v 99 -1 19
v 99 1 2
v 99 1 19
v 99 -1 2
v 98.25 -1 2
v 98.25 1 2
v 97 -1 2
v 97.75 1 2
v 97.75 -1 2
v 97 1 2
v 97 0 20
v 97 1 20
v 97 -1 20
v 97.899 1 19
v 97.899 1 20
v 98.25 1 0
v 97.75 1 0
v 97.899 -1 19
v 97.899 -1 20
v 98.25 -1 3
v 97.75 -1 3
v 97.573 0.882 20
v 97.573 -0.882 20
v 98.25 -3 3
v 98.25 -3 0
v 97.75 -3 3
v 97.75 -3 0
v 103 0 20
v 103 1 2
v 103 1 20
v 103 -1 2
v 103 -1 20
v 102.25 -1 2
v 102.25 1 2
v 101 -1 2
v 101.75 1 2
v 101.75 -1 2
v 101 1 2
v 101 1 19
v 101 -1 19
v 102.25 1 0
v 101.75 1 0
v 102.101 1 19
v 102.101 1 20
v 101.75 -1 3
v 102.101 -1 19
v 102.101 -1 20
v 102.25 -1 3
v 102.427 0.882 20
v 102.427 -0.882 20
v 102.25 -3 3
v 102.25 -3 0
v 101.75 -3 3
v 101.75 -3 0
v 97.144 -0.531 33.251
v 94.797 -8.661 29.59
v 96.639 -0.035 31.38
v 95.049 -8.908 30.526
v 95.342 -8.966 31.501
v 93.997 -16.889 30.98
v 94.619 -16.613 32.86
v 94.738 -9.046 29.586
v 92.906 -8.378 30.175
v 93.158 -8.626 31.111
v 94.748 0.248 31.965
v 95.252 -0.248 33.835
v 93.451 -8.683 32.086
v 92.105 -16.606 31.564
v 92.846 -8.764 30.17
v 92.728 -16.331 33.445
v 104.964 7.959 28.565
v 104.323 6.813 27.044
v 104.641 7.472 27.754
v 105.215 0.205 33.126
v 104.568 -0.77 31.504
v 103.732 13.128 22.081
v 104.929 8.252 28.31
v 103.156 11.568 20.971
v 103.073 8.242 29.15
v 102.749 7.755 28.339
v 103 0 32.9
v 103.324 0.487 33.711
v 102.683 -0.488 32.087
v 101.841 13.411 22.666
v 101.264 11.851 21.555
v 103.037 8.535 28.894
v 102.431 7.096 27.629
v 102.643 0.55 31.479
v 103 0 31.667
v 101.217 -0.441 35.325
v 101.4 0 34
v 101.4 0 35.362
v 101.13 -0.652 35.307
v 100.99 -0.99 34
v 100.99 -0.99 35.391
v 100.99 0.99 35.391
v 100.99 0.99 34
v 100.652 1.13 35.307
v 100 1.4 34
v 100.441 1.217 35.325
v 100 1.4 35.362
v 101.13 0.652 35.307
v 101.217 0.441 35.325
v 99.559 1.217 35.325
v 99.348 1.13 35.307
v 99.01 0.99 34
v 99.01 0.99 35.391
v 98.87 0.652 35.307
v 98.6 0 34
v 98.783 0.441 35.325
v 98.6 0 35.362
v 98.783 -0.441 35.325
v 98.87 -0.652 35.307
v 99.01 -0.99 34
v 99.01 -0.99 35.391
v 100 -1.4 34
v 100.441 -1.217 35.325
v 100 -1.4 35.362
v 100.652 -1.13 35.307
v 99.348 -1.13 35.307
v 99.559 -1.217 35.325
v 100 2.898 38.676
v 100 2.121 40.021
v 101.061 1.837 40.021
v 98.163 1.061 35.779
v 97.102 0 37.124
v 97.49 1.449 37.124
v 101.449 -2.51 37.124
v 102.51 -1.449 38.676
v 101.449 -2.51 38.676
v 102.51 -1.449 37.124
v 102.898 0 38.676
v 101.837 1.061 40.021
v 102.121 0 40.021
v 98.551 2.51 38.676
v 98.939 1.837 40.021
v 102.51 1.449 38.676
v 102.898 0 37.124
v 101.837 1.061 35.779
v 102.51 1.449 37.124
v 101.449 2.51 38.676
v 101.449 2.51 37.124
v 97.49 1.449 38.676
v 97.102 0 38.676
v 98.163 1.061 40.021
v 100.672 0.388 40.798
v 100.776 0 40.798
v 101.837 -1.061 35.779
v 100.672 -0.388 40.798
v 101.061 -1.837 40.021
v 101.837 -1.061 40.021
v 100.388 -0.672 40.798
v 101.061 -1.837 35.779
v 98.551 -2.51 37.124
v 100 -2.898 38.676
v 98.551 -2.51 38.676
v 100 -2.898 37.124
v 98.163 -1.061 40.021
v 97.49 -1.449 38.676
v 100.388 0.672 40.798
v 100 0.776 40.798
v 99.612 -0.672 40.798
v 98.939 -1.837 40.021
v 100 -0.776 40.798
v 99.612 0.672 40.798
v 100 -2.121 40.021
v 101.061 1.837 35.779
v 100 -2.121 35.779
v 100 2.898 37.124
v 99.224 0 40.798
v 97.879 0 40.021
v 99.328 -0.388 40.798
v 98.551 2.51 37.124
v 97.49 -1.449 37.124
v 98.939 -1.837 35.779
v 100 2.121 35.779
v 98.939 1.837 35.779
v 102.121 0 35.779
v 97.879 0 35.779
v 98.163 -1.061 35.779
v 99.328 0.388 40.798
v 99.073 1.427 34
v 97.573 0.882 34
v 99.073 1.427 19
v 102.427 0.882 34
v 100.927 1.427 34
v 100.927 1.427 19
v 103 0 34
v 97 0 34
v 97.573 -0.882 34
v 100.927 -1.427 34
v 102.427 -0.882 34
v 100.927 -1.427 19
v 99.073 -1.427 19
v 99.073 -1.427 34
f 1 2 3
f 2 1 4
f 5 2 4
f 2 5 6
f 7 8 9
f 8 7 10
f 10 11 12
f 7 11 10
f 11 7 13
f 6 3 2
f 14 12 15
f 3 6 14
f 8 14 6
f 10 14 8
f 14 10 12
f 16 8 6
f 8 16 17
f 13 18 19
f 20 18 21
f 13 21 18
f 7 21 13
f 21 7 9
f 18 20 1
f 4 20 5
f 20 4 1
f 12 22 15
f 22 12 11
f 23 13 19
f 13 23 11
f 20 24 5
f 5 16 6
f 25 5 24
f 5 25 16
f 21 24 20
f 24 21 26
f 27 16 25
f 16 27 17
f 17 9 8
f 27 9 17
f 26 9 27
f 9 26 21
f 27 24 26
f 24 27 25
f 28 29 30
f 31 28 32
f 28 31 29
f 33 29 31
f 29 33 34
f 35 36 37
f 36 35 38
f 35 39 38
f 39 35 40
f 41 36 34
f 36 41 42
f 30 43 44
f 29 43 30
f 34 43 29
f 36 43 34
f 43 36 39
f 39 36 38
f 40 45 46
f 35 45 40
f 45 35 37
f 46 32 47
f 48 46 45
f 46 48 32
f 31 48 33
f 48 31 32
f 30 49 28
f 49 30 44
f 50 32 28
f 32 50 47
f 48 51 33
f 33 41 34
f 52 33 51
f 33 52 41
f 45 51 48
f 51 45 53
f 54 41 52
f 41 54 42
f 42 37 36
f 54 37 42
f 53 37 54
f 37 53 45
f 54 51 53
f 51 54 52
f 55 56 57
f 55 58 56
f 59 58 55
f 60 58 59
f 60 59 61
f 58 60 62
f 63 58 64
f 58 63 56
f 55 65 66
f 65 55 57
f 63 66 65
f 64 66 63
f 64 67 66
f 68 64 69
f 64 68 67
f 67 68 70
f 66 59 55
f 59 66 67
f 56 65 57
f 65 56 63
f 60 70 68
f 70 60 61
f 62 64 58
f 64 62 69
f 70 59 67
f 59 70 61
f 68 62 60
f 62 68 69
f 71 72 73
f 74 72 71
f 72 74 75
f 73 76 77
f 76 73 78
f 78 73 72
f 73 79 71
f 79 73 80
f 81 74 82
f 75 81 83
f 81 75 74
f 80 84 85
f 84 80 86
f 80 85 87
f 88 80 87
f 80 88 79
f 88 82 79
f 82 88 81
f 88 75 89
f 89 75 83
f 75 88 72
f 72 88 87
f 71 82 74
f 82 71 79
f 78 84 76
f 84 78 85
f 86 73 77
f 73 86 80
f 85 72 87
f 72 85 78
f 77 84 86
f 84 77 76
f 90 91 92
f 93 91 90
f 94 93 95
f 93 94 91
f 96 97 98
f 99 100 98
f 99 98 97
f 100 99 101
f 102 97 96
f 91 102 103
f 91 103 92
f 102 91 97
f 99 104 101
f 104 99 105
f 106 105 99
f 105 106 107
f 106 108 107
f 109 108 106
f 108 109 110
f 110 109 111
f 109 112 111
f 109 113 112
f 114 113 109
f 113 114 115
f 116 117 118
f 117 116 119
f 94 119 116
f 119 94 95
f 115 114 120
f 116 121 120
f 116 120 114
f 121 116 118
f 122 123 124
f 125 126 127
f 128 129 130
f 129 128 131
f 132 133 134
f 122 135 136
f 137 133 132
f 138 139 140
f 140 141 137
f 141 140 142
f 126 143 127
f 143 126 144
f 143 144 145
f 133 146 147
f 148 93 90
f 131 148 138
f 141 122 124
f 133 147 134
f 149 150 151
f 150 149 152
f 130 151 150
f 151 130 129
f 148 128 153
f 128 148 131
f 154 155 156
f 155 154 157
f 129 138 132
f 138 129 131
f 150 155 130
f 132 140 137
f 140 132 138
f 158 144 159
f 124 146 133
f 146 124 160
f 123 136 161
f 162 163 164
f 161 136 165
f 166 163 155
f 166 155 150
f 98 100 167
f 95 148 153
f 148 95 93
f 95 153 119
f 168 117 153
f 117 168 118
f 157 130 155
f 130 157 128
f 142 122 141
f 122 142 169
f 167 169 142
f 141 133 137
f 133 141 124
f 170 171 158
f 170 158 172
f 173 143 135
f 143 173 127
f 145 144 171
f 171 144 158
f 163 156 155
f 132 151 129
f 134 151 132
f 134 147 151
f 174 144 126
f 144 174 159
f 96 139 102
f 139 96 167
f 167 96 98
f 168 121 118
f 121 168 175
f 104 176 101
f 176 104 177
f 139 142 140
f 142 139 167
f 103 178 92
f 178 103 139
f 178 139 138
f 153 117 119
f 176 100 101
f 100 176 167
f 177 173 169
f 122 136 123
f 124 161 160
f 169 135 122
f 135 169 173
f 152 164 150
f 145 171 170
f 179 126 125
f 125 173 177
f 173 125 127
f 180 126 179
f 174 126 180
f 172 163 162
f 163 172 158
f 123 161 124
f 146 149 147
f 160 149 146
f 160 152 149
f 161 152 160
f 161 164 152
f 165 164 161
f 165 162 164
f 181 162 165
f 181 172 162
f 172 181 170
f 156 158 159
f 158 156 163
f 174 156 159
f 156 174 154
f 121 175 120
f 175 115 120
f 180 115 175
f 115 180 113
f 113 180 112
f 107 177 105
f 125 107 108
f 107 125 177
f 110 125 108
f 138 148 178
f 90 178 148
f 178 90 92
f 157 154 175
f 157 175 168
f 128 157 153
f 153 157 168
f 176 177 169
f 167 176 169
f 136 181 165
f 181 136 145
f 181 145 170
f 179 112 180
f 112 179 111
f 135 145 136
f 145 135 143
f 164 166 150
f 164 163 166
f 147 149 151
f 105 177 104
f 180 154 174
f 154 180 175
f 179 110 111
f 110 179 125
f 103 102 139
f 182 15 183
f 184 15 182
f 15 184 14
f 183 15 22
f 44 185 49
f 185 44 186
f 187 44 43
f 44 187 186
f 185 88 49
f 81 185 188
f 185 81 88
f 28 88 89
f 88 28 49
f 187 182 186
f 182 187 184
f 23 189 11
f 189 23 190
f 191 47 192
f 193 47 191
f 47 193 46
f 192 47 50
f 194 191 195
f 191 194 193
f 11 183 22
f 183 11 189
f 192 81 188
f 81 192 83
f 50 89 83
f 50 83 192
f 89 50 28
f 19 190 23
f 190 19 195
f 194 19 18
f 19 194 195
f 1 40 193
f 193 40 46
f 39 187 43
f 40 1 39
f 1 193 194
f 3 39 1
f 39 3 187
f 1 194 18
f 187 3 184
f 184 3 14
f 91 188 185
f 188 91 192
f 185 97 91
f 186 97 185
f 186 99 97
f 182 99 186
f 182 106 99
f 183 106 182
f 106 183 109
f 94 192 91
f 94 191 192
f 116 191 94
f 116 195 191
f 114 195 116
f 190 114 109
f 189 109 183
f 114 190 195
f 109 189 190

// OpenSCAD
// Created in 2023 by Ryan A. Colyer.
// This work is released with CC0 into the public domain.
// https://creativecommons.org/publicdomain/zero/1.0/

// View, Animate, FPS: 30, Steps: 200

module IceSkater(bend, extend, crouch) {
  translate([0, 0, 2])
  rotate([0, -20*bend, 0]) {
    translate([-(1-bend)*2-1, bend*4-1, 0]) {
      translate([0.75, -2, -2]) cube([0.5, 4, 3]);
      rotate([bend*15+crouch*45, -bend*5, 0]) {
        cube([2,2,9]);
        translate([0,0,9]) rotate([-2*crouch*45, 0, 0]) rotate([-bend*5, 0, 0]) {
          cube([2,2,9]);
        }
      }
    }
    translate([(1-bend)*2-1, -bend*4-1, 0]) {
      translate([0.75, -2, -2]) cube([0.5, 4, 3]);
      rotate([bend*0+crouch*45, bend*5, 0]) {
        cube([2,2,9]);
        translate([0,0,9]) rotate([-2*crouch*45, 0, 0]) rotate([-bend*25, 0, 0]) {
          cube([2,2,9]);
        }
      }
    }
    rotate([crouch*45, 0, 0]) translate([0,0,9]) rotate([-2*crouch*45, 0, 0]) {
      translate([0,0,8]) rotate([crouch*45, 0, 0]) {
        scale([2,1,1]) cylinder(r=1.5, h=15, $fn=10);
        translate([0, 0, 14.9]) {
          cylinder(r=1.4, h=4, $fn=8);
          translate([0, 0, 4]) sphere(r=3, $fn=12);
          translate([-5, 0, -1]) {
            rotate([170-80*extend, 20*extend, -10*extend]) {
              translate([0,-1,0]) cube([2,2,9]);
              translate([0, 0, 9]) {
                rotate([-150*(1-extend), 0, 0]) translate([0,-1,0]) cube([2,2,8]);
              }
            }
          }
          translate([3, 0, -1]) {
            rotate([170+80*extend, 20*extend, -10*extend]) {
              translate([0,-1,0]) cube([2,2,9]);
              translate([0, 0, 9]) {
                rotate([-150*(1-extend), 0, 0]) translate([0,-1,0]) cube([2,2,8]);
              }
            }
          }
        }
      }
    }
  }
}

function smoother_step(x) = x<0?0: x>1?1: 6*pow(x,5)-15*pow(x,4)+10*pow(x,3);
function smooth_speed(v) = sin(v*90);
function smooth_start(v) = 1-sin((1-v)*90);
rotate([0, 0, $t < 0.03 ? smooth_start($t/0.03)*0.03*360/0.85 : $t<0.82 ? 360*$t/0.85 : $t<0.85 ? (smooth_speed(($t-0.82)/0.03)*0.03+0.82)*360/0.85 : 0])
translate([100, 0, $t<0.85 ? 0 : $t < 0.985 ? 20*(1-(($t-0.915)/0.070)^2) : 0])
rotate([0, 0, $t<0.85 ? 0 : 360*($t-0.85)/0.05])
IceSkater(
  $t < 0.03 ? smoother_step(($t)/0.03) :
    $t < 0.82 ? 1 :
    $t < 0.85 ? 1-smoother_step(($t-0.82)/0.03) : 0,
  $t < 0.83 ? 0.85 :
    $t < 0.88 ? 0.85*(1-smoother_step(($t-0.83)/0.05)) :
    $t < 0.95 ? 0 :
    0.85*smoother_step(($t-0.95)/0.05),
  $t < 0.77 ? 0 :
    $t < 0.83 ? smoother_step(($t-0.77)/0.06) :
    $t < 0.87 ? (1-smoother_step(($t-0.83)/0.04)) :
    $t < 0.98 ? 0 :
    0.5*(1-(($t-0.99)/0.01)^2)
);
